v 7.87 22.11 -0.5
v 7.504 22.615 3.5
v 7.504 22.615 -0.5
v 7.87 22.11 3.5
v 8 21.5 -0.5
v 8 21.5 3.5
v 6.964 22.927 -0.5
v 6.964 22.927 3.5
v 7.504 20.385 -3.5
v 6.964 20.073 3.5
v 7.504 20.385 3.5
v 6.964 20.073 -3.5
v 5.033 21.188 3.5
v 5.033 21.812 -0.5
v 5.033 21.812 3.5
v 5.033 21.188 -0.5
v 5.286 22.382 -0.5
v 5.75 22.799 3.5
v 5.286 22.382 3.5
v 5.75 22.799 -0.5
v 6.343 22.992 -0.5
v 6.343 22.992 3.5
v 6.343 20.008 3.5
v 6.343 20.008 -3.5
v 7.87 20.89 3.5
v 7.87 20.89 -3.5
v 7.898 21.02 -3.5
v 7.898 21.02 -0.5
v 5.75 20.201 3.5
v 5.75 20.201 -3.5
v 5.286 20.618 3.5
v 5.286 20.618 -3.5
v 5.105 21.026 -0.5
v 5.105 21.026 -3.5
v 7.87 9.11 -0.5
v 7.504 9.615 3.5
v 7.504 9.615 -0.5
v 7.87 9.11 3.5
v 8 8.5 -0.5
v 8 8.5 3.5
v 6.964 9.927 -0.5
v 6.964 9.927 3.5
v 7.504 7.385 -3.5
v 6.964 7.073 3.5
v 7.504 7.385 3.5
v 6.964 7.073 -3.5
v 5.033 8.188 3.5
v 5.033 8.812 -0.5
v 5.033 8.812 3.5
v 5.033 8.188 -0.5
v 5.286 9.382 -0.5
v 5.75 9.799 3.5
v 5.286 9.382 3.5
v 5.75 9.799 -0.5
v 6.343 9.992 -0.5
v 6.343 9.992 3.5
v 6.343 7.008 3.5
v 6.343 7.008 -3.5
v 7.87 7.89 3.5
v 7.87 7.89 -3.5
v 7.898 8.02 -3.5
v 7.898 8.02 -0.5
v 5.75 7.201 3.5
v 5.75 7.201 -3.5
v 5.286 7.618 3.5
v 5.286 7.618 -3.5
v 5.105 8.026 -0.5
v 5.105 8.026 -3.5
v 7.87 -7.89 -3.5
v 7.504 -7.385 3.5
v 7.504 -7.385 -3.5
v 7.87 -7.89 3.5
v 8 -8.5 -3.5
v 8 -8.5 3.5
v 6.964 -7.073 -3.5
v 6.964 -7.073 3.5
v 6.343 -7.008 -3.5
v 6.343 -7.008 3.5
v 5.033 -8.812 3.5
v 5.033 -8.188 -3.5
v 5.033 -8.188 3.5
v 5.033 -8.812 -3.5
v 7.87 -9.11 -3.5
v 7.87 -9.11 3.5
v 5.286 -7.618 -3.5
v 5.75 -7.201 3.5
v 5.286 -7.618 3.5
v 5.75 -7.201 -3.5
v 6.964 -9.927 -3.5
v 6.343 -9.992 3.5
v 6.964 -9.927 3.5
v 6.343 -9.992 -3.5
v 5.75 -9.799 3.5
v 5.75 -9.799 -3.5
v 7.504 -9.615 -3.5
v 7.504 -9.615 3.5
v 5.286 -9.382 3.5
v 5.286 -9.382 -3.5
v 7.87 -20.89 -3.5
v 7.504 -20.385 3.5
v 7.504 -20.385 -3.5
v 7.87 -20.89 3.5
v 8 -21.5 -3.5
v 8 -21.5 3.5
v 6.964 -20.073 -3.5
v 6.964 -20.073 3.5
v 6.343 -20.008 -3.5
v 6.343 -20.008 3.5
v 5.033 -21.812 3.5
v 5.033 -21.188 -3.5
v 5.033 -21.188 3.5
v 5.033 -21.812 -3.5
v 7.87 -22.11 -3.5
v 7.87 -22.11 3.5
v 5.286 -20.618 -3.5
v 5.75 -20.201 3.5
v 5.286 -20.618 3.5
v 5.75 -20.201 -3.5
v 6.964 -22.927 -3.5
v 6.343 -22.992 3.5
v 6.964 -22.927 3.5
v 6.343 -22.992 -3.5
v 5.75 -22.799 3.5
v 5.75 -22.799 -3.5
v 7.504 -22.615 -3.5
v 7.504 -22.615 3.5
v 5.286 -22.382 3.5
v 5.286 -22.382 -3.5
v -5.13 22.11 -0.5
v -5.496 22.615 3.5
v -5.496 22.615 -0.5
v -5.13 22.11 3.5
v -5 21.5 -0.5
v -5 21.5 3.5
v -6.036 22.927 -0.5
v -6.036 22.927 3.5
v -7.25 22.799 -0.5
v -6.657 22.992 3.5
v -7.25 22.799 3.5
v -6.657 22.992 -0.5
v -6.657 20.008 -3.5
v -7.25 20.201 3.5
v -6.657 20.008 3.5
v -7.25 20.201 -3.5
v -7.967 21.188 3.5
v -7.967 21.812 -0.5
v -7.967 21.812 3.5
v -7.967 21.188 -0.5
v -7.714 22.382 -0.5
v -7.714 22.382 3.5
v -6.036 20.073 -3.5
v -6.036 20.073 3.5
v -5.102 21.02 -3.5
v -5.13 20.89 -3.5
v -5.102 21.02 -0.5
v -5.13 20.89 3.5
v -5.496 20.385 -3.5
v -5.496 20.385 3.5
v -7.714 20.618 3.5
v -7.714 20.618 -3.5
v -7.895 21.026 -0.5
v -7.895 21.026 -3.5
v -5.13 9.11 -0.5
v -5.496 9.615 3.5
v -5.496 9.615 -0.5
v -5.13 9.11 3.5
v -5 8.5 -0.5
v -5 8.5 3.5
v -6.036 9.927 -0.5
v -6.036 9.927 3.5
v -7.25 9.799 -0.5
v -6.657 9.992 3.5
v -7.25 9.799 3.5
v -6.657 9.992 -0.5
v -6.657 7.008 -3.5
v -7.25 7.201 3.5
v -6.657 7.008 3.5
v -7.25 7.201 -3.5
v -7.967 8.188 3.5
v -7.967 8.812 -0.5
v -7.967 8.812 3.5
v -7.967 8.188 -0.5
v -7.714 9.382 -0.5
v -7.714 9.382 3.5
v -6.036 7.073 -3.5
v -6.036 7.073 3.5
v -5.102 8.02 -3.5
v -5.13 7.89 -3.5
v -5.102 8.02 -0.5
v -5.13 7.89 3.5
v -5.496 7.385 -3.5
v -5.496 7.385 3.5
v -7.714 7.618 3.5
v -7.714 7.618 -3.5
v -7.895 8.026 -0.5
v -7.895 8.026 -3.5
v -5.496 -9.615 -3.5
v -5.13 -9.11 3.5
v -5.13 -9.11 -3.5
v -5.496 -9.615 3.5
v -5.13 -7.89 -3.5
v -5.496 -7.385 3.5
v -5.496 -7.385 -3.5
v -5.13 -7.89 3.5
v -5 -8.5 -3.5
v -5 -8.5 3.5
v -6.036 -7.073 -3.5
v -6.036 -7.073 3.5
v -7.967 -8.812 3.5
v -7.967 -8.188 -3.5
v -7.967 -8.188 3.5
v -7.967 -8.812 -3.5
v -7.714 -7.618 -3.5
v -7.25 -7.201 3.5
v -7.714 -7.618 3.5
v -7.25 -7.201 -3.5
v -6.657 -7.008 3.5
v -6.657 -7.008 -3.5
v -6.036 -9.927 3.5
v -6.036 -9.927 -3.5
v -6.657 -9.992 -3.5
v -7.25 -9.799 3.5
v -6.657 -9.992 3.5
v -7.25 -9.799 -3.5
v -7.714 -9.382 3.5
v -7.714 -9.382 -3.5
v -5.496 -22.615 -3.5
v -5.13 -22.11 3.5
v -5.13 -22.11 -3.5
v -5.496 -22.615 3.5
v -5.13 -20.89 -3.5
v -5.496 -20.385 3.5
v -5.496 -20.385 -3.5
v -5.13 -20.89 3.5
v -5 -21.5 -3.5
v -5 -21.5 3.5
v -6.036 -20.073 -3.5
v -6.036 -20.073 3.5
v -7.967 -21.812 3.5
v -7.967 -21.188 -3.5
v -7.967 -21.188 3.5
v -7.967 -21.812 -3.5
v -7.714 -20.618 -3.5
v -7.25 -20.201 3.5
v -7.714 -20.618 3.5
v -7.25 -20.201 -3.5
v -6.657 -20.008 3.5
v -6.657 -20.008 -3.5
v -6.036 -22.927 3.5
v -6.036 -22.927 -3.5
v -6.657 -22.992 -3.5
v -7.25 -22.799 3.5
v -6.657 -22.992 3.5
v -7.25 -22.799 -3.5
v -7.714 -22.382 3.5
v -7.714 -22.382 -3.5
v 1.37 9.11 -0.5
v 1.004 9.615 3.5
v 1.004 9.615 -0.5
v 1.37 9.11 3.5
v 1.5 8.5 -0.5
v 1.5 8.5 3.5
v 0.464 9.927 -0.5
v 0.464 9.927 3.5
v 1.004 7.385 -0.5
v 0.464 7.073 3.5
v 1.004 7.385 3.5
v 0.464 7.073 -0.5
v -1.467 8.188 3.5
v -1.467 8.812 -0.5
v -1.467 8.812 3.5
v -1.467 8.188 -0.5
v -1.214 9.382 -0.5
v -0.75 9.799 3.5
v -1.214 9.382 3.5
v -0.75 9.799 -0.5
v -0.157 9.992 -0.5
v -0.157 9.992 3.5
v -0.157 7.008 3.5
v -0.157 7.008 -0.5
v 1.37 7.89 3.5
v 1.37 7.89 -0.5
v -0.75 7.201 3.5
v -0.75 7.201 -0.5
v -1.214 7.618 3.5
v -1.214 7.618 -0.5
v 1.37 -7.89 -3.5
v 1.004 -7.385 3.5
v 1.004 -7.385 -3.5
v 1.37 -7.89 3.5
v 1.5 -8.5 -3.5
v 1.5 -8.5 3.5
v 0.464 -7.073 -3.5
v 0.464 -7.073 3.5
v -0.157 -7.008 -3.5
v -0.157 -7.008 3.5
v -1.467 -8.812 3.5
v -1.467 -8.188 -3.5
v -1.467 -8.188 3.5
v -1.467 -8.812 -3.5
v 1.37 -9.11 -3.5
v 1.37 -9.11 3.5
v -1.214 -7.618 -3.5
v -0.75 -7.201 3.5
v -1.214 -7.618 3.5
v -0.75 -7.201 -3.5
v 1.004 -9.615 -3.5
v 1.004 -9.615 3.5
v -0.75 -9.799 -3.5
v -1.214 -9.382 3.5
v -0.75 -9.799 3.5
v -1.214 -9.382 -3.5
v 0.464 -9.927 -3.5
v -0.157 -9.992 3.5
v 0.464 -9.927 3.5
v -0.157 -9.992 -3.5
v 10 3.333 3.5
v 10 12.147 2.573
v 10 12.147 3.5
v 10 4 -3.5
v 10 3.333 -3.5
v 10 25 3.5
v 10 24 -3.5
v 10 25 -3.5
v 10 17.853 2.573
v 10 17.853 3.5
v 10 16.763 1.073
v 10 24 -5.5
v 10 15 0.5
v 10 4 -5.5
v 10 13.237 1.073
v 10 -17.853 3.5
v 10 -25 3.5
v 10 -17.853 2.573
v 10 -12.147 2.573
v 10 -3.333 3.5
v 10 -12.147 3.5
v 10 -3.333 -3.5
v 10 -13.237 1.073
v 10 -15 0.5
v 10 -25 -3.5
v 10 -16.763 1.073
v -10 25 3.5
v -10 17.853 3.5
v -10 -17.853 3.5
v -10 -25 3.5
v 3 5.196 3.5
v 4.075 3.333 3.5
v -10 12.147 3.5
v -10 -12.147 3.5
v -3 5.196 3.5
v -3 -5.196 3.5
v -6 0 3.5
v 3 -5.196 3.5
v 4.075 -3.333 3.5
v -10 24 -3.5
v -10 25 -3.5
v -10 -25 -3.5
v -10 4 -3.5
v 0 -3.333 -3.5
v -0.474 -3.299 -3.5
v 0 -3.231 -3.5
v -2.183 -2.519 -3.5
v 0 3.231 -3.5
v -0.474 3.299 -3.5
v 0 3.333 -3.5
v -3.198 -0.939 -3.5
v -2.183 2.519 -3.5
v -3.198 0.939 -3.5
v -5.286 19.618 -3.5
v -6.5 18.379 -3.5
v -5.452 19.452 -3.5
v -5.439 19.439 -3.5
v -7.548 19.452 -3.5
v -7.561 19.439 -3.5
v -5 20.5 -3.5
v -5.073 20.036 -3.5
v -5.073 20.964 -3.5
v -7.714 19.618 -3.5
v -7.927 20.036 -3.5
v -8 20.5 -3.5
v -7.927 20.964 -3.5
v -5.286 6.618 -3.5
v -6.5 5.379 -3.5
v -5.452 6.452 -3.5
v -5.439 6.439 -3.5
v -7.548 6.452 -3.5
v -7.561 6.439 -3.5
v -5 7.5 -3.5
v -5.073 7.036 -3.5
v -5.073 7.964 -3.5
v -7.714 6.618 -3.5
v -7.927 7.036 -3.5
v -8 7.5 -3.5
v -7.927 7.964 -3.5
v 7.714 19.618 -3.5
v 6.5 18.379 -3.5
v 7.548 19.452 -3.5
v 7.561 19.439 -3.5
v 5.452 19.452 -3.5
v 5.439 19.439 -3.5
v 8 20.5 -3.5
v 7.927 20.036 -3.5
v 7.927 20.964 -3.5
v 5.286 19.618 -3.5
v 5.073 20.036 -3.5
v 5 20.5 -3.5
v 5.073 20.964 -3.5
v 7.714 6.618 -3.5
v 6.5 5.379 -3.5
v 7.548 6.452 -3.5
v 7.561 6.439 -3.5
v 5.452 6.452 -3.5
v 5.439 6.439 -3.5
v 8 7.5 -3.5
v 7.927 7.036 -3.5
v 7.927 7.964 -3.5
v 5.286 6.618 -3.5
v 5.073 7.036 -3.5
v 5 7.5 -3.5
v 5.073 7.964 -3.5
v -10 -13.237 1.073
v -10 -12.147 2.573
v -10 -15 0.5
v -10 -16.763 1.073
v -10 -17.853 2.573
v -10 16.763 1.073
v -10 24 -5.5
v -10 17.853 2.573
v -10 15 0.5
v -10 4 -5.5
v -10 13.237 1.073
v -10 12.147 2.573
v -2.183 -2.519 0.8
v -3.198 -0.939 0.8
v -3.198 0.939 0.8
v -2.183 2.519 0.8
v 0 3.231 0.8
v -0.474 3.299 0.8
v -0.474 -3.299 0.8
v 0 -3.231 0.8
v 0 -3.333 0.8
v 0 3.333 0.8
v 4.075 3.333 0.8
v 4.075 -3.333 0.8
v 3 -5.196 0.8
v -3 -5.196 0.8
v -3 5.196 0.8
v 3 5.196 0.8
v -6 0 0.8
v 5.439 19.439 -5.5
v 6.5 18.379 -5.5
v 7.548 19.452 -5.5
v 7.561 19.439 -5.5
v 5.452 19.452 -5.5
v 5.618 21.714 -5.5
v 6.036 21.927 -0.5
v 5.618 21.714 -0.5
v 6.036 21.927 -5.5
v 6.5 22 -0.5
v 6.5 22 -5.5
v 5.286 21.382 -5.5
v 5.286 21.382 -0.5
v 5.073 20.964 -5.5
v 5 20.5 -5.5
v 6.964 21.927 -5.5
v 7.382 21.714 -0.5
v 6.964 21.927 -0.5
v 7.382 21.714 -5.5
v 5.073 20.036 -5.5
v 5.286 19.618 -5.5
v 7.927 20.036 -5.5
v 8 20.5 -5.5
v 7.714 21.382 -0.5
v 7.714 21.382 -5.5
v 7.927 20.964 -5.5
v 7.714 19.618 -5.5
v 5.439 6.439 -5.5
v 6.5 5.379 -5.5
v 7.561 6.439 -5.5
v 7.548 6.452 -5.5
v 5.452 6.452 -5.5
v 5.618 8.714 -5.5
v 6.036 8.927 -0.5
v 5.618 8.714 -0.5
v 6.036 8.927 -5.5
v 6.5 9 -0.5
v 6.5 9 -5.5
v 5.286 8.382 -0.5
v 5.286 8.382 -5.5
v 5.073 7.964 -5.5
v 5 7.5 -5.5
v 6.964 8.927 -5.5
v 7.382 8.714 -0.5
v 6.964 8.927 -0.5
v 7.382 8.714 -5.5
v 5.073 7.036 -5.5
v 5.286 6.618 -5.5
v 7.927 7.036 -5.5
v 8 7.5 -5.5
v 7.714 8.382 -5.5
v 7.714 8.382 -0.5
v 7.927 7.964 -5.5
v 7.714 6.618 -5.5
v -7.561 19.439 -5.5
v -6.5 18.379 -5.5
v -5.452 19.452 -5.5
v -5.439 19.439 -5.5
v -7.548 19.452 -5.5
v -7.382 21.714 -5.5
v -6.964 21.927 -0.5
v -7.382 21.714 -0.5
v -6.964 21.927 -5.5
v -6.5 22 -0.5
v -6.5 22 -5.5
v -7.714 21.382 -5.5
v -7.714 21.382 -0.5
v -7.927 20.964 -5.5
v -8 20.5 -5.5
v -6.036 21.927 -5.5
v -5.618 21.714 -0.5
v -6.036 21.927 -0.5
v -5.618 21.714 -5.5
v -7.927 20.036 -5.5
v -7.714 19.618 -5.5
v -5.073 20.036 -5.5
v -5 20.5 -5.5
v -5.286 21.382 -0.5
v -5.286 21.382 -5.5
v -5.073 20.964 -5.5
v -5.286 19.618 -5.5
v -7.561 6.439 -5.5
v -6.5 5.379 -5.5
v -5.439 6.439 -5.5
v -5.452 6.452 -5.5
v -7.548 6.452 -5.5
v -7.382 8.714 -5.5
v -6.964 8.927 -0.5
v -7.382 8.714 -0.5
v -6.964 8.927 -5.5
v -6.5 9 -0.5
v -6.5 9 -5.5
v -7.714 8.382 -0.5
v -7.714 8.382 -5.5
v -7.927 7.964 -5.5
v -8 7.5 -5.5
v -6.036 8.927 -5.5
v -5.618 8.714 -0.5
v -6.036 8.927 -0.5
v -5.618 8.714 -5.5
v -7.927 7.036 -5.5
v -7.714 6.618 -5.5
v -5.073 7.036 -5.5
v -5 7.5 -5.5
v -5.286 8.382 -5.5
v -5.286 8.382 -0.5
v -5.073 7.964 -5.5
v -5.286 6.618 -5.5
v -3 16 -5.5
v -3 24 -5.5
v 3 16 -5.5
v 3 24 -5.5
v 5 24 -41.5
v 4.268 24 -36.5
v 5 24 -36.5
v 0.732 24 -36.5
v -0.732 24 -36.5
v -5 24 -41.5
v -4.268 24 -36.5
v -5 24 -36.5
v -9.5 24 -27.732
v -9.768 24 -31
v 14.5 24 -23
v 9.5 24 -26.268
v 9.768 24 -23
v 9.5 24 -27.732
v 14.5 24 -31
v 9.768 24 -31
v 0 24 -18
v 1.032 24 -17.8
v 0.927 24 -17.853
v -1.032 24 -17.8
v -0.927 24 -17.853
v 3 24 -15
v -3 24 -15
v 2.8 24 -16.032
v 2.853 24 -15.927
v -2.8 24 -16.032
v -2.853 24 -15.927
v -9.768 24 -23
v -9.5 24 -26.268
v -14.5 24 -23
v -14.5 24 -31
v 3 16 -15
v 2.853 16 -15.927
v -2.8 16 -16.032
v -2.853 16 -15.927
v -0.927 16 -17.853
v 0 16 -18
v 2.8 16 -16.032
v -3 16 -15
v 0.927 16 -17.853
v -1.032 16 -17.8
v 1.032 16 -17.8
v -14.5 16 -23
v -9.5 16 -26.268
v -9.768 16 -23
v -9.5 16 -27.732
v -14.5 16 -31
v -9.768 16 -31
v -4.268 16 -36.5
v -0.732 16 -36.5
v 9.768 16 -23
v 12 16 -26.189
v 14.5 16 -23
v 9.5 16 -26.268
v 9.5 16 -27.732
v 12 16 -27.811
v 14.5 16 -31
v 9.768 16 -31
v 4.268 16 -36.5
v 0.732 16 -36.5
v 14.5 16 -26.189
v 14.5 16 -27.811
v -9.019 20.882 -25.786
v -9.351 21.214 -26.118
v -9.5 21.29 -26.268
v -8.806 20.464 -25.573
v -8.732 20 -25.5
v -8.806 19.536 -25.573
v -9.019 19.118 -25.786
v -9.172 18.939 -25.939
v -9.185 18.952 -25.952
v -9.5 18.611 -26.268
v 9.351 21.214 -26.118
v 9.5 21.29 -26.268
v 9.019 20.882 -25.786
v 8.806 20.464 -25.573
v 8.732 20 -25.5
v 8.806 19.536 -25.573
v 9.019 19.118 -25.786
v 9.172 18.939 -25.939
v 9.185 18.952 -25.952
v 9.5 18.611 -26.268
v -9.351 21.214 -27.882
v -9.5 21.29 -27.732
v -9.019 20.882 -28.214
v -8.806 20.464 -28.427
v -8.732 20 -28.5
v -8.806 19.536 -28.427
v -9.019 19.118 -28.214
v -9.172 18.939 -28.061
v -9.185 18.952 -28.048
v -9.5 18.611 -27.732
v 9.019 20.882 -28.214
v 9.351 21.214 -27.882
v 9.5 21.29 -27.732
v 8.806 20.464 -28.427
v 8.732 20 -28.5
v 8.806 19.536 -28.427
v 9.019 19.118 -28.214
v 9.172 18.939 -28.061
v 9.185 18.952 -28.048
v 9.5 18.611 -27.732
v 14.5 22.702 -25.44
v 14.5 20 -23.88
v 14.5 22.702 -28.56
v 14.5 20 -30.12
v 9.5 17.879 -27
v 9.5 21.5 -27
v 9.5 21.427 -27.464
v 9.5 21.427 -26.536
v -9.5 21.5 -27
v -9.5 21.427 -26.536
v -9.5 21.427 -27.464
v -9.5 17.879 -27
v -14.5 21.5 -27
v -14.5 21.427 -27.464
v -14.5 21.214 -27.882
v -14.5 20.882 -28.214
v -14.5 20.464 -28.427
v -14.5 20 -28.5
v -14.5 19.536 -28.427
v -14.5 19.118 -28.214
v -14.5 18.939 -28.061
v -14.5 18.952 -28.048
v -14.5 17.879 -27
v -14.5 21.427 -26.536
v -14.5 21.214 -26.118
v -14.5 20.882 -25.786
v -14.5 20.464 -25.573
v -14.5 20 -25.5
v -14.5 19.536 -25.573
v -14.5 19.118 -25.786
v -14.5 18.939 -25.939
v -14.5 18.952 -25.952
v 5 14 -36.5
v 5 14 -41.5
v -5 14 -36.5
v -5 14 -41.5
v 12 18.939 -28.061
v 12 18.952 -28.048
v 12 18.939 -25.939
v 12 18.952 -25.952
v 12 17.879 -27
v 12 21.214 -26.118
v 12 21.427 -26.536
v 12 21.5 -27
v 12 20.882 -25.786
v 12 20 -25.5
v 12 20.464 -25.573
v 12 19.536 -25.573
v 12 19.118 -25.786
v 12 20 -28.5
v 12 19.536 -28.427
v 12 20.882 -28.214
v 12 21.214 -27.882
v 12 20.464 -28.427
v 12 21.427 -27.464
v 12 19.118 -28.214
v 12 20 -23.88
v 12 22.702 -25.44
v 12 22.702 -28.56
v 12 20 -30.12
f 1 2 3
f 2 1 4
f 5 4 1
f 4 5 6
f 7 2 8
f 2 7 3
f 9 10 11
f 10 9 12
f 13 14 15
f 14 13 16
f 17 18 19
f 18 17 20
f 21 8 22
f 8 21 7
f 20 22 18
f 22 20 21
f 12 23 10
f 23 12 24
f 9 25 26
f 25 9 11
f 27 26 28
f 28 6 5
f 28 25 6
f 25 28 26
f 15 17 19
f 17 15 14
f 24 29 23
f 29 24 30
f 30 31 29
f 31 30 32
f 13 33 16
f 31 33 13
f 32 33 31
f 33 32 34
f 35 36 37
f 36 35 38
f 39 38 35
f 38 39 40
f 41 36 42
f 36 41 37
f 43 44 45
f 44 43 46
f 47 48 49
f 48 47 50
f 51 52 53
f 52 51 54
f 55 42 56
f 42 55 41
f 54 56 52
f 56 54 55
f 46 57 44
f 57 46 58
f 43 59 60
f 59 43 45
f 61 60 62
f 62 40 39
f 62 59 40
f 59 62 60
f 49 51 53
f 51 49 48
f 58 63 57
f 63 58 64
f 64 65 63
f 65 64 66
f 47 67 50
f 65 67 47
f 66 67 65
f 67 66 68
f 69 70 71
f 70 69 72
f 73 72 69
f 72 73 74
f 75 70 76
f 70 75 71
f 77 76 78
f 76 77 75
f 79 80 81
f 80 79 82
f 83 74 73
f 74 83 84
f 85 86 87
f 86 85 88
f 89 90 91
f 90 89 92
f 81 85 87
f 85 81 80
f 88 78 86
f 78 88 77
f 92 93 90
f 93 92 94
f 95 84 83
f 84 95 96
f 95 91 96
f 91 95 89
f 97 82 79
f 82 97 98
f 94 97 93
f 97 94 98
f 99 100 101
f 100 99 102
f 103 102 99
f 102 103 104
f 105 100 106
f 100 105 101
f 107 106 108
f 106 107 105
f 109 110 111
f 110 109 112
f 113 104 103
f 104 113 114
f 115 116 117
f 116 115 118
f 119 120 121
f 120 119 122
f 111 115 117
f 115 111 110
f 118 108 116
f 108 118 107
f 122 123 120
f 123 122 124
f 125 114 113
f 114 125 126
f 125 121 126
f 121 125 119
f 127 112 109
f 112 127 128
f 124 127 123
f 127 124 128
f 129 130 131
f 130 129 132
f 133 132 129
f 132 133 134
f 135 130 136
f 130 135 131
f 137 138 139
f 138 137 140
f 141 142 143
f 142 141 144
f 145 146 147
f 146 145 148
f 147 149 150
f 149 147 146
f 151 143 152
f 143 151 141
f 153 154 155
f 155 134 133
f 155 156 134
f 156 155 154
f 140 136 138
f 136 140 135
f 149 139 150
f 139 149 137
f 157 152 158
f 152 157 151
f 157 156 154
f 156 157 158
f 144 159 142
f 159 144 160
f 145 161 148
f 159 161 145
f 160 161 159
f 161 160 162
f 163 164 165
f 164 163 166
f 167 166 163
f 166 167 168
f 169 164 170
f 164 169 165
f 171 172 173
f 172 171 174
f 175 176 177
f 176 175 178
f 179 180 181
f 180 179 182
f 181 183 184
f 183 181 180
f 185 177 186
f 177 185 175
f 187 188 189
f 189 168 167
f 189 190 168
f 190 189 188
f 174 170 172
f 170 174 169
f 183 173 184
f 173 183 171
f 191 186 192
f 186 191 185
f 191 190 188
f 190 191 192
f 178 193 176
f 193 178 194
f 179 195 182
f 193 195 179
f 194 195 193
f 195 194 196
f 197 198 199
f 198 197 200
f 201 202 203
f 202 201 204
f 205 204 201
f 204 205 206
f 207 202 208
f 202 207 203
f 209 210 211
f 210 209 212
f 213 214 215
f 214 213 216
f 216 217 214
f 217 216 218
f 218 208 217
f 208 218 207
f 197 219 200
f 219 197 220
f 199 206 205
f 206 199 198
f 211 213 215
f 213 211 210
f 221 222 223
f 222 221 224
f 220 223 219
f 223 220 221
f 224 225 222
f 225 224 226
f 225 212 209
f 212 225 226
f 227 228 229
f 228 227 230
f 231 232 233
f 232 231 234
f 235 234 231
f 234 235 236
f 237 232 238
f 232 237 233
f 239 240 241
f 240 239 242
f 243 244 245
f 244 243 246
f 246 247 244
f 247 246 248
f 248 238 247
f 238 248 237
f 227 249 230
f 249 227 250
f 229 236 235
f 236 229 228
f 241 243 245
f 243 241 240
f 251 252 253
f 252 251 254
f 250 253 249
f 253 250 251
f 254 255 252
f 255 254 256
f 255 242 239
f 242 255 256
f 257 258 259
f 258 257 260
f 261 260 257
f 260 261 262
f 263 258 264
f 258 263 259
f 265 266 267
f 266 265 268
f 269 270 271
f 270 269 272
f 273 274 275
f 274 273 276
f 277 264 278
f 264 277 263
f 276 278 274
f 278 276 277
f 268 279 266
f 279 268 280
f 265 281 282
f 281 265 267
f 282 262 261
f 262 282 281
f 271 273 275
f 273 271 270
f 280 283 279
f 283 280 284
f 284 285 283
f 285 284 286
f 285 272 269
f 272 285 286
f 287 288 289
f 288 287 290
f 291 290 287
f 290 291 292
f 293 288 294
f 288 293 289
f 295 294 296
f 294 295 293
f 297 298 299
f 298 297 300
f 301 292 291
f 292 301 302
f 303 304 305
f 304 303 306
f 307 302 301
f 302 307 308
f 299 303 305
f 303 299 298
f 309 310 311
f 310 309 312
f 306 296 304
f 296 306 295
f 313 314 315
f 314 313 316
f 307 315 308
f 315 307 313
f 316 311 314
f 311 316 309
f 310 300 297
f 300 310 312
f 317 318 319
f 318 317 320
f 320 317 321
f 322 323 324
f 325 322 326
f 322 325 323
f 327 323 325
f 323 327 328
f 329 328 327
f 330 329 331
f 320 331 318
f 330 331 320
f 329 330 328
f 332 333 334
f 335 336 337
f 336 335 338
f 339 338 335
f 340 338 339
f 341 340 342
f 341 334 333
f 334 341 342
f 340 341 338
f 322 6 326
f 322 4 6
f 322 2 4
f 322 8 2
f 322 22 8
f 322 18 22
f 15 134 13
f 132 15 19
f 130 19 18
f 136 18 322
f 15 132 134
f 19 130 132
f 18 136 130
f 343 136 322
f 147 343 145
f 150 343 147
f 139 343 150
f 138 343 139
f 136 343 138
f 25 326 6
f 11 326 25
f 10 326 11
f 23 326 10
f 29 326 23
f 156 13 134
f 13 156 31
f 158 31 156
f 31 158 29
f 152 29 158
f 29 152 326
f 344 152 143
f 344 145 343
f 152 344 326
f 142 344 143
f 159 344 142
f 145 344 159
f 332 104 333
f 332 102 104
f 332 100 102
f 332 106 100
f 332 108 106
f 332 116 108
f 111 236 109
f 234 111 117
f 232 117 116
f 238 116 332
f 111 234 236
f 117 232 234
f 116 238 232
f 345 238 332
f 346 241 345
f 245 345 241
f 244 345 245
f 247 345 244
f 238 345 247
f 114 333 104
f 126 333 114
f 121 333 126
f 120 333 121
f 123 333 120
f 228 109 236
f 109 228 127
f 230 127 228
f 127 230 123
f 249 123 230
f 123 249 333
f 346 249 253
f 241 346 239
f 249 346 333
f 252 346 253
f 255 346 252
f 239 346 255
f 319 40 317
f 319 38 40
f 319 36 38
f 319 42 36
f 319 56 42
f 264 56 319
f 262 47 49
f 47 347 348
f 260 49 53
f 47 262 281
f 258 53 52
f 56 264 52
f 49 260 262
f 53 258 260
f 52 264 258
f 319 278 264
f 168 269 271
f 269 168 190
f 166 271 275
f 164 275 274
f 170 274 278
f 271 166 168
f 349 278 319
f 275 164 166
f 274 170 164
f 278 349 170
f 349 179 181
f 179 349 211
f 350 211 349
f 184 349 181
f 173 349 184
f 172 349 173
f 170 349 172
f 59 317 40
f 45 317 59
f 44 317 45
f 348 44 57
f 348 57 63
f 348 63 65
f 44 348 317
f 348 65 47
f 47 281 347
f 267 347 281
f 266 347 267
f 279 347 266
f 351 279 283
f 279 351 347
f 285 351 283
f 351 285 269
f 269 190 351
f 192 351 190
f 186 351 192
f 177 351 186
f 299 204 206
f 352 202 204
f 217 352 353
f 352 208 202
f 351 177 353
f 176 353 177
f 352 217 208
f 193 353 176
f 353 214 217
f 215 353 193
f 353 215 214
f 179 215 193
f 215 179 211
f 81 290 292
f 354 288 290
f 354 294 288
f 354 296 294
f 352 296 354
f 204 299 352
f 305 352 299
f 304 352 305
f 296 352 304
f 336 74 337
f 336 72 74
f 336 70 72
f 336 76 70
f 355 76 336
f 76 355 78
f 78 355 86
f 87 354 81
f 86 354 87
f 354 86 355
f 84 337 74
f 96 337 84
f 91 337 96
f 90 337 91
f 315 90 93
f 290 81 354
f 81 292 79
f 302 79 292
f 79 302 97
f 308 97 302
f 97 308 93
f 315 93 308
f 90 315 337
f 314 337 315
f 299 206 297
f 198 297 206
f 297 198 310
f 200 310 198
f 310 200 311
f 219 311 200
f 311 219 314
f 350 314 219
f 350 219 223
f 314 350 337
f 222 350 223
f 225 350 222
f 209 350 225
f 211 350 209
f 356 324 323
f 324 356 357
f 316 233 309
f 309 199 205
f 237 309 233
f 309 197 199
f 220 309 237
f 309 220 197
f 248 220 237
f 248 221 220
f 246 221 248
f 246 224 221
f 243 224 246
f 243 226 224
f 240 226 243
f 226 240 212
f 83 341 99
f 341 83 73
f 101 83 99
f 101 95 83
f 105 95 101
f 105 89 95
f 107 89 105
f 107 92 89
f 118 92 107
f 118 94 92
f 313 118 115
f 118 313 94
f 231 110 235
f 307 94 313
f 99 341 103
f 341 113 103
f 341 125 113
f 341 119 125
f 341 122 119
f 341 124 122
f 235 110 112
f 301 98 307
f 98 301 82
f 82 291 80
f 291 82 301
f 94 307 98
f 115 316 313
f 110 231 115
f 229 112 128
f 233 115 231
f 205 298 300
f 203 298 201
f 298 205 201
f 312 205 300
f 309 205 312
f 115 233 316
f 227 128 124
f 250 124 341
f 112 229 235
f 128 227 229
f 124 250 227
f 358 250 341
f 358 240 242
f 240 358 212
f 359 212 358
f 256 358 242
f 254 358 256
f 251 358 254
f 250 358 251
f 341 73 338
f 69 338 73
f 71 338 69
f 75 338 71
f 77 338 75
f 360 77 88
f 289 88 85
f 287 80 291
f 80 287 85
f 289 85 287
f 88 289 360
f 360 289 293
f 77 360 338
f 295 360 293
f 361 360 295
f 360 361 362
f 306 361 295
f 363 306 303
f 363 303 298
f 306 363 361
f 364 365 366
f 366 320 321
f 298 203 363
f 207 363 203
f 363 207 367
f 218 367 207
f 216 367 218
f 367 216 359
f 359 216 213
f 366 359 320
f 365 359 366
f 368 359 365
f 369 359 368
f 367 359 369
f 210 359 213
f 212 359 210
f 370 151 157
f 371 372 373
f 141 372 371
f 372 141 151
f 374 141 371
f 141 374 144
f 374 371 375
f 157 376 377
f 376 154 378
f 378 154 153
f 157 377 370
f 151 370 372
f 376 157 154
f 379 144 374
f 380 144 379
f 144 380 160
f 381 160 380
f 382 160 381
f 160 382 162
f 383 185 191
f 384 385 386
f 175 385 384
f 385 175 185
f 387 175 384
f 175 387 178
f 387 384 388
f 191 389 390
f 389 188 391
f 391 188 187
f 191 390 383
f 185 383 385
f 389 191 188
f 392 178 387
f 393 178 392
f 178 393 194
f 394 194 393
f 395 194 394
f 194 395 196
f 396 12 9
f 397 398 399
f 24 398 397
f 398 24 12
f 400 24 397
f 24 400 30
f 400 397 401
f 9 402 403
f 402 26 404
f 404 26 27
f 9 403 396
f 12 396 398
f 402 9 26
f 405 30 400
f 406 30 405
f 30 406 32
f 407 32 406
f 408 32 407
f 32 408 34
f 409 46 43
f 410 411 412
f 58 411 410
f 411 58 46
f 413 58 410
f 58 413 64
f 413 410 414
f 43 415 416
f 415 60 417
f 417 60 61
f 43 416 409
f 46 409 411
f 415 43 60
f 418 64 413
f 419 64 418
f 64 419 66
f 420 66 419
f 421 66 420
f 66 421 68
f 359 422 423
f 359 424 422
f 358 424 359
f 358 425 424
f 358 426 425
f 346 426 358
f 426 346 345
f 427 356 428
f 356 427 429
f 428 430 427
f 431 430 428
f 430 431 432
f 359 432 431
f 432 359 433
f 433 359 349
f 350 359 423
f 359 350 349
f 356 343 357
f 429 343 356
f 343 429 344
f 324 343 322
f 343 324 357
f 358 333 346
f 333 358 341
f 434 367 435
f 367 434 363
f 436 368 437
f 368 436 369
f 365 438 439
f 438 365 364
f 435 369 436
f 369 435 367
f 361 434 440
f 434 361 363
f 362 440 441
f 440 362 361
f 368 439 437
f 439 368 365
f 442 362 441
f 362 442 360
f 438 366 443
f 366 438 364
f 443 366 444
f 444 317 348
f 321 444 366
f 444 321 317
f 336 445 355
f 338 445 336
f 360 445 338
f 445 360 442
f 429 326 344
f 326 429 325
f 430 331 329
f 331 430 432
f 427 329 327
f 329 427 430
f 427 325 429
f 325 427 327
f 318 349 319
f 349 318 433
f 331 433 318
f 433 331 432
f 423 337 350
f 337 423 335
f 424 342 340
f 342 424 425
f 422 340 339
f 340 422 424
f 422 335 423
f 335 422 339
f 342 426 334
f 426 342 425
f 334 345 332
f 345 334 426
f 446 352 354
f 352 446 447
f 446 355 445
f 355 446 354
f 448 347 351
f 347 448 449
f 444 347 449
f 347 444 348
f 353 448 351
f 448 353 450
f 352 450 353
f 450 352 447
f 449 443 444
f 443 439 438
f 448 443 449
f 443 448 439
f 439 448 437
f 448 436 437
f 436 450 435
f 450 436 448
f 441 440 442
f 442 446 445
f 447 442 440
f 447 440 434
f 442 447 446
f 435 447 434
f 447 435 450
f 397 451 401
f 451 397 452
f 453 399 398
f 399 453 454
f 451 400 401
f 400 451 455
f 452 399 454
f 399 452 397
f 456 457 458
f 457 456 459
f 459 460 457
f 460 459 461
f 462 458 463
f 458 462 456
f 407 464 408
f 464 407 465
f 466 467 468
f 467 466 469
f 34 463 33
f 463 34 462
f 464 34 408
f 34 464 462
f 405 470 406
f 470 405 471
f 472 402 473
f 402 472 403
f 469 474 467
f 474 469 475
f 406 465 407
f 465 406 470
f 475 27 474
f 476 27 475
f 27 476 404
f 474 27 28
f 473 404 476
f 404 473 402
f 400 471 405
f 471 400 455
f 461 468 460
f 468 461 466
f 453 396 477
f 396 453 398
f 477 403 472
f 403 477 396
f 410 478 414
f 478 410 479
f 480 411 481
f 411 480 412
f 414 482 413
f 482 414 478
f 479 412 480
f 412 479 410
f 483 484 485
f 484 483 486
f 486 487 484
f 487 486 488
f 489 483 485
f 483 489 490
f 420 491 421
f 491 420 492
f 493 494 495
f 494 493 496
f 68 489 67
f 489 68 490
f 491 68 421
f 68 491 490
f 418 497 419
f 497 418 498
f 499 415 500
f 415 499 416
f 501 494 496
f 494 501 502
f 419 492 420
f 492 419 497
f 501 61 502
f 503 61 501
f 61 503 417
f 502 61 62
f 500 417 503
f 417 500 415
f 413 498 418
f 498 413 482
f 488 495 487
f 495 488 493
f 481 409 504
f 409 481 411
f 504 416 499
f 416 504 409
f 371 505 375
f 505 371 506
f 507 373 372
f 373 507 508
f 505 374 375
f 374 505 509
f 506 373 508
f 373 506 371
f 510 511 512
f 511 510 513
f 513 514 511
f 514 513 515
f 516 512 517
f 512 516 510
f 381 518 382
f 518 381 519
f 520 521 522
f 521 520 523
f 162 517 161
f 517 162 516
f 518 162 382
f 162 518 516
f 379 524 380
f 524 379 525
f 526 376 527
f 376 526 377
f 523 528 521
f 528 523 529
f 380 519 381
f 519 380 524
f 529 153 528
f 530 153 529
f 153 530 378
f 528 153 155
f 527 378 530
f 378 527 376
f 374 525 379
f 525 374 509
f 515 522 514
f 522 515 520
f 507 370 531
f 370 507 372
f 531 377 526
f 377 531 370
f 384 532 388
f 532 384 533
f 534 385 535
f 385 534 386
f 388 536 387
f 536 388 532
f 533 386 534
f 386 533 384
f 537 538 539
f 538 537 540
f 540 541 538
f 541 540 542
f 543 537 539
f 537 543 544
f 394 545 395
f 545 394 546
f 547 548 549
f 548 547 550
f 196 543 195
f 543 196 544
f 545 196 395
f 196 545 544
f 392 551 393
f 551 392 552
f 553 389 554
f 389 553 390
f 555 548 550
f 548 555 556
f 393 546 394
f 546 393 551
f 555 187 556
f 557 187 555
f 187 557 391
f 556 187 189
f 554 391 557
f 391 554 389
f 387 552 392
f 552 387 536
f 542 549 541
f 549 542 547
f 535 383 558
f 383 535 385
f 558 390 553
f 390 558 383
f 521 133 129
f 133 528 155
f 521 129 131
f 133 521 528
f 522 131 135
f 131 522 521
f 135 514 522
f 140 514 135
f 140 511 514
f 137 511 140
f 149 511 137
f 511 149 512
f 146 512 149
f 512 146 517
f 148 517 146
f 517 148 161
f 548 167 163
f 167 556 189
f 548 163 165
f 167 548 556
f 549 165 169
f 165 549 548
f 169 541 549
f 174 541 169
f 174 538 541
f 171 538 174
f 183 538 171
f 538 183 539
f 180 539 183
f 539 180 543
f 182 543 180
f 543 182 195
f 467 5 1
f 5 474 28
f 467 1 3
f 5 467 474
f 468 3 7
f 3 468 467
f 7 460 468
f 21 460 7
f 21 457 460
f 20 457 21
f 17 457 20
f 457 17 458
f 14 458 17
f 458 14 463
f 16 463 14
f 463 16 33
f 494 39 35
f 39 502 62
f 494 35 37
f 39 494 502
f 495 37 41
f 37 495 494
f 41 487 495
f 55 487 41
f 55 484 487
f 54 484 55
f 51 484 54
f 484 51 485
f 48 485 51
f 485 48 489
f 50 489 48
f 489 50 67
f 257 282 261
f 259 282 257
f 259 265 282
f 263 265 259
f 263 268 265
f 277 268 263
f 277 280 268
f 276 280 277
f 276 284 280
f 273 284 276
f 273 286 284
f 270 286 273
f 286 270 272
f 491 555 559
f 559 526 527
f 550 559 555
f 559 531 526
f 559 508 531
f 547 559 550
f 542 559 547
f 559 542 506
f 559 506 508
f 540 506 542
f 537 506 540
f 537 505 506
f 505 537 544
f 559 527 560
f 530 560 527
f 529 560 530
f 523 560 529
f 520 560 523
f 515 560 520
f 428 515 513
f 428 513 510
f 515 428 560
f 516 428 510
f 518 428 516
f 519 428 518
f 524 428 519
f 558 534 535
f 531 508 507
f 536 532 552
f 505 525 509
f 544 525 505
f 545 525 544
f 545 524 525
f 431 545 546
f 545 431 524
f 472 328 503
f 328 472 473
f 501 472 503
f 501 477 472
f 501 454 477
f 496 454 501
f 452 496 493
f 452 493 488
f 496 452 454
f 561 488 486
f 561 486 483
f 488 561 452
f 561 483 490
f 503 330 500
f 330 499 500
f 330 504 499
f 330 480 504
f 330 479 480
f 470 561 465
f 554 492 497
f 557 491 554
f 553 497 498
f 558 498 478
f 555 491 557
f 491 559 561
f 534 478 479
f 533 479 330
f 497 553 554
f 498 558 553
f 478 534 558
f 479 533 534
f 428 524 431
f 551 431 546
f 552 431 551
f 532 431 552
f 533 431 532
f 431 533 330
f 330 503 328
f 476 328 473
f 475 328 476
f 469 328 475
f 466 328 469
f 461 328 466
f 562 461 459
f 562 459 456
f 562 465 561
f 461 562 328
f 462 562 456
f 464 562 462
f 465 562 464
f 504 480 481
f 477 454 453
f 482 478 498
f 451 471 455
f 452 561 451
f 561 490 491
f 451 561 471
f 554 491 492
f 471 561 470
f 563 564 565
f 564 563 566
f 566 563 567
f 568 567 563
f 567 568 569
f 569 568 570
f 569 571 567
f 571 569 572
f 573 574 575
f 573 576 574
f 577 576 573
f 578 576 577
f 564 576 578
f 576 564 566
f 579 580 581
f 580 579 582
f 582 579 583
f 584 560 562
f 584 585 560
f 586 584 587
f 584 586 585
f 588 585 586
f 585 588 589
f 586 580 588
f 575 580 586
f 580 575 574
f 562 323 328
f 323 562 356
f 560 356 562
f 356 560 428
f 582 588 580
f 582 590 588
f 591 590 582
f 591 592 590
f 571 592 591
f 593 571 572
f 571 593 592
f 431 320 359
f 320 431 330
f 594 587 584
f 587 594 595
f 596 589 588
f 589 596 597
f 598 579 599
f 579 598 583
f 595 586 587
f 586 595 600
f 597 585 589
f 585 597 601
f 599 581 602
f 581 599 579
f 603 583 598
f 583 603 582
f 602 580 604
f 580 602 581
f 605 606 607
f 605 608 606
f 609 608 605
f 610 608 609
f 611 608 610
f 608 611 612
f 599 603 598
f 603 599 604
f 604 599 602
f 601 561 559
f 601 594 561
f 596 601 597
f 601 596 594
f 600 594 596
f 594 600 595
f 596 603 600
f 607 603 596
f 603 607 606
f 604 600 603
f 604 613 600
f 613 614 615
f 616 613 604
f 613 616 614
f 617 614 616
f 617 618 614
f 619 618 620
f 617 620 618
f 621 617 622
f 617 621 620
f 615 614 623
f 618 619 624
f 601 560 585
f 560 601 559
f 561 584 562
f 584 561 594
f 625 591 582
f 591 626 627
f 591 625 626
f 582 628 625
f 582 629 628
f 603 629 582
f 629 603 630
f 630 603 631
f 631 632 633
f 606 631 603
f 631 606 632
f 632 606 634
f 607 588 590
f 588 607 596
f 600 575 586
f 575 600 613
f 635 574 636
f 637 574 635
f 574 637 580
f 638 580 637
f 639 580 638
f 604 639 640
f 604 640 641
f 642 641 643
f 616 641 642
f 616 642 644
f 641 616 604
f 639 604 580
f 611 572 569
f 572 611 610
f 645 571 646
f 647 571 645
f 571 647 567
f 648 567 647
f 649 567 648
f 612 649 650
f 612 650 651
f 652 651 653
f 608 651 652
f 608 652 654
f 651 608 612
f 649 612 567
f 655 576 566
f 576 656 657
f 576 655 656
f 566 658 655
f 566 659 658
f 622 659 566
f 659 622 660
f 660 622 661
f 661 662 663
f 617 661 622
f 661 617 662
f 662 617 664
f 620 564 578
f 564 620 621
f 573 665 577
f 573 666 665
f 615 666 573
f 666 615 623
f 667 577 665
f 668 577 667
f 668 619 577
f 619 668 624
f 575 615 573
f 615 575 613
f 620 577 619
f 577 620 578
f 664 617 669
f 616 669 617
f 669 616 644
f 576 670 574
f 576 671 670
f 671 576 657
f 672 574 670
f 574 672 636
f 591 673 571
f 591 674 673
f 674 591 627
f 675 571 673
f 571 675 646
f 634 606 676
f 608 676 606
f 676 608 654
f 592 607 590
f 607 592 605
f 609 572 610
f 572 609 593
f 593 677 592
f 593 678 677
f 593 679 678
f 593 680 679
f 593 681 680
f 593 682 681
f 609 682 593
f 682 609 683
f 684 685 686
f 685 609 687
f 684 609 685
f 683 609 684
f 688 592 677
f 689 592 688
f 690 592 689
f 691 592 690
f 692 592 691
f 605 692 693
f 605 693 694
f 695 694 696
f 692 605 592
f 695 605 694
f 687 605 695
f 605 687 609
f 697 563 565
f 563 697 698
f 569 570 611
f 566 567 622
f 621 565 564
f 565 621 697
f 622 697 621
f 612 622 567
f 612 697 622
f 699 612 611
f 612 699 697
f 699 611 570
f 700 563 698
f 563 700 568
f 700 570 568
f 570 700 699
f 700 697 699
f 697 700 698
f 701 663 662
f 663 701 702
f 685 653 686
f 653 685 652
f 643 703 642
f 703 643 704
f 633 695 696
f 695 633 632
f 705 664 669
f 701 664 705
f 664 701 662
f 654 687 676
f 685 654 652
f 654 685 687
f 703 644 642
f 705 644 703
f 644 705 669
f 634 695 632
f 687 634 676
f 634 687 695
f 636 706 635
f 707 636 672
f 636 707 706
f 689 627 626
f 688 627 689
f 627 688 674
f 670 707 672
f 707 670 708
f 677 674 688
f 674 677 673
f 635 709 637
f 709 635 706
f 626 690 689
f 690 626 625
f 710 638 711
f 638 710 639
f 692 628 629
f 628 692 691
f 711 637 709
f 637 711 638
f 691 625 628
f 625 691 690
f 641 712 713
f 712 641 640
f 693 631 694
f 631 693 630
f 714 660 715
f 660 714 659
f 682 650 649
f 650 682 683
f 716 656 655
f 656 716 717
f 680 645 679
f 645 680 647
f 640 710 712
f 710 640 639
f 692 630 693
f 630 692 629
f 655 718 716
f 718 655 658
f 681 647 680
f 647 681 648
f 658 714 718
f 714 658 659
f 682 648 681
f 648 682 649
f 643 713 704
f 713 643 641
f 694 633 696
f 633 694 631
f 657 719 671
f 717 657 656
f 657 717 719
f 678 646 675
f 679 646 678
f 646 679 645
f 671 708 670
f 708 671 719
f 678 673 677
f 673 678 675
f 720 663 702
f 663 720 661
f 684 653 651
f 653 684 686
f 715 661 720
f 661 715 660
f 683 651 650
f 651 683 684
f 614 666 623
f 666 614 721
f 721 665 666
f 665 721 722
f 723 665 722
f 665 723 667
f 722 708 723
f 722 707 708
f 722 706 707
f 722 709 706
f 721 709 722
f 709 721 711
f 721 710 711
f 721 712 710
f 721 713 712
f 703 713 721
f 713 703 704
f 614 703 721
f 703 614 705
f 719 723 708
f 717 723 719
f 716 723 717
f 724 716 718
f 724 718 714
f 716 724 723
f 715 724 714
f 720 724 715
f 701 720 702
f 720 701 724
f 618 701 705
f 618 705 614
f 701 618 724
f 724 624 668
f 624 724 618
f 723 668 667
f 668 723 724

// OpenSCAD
// file: parameters.scad
// Parameters file for RepRap Huxley (and maybe Mendel)

huxley=true;
mendel=!huxley;

pi=3.14159265;

// The relative location in your file system where the .dxf files are
// DXFs are for quick development.  They should be replaced by parameterised CSG in dure course.

fileroot="DXF-files/";

rodsize = 6;	//threaded/smooth rod diameter in mm
xaxis = 182.5;	//width of base in mm
yaxis = 266.5;	//length of base in mm


screwsize = 3;	//bearing bore/screw diameter in mm
bearingsize = 10;	//outer diameter of bearings in mm
bearingwidth = 4;	//width of bearings in mm


rodpitch = rodsize / 6;
rodnutsize = 0.8 * rodsize;
rodnutdiameter = 1.9 * rodsize;
rodwashersize = 0.2 * rodsize;
rodwasherdiameter = 2 * rodsize;
screwpitch = screwsize / 6;
nutsize = 0.8 * screwsize;
nutdiameter = 1.9 * screwsize;
washersize = 0.2 * screwsize;
washerdiameter = 2 * screwsize;
partthick = 2 * rodsize;
vertexrodspace = 2 * rodsize;


c = [0.3, 0.3, 0.3];
rodendoffset = rodnutsize + rodwashersize * 2 + partthick / 2;
vertexoffset = vertexrodspace + rodendoffset;


renderrodthreads = false;
renderscrewthreads = false;
fn = 36;

// The gap between the joining rods at a vertex

vertex_radius=sqrt(rodsize*rodsize + vertexoffset*vertexoffset);
vertex_ang = atan(vertexoffset/rodsize)-30;
vertex_gap = 2*vertex_radius*cos(vertex_ang);

// Nema 14 dimensions - these are absolute

nema14_square=35.3;
nema14_screws=26;
nema14_screw_r=1.5;
nema14_hub=22;
nema14_hub_depth=2;
nema14_length=36;
nema14_shaft=5;
nema14_shaft_length=66;
nema14_shaft_projection=19;

// Nema 11 dimensions - these are absolute

nema11_square=28.5;
nema11_screws=23;
nema11_screw_r=1.25;
nema11_hub=22;
nema11_hub_depth=2;
nema11_length=44.5;
nema11_shaft=5;
nema11_shaft_length=78;
nema11_shaft_projection=18;

// Limit switch parameters

limit_switch_hole_diameter=2.5;
limit_switch_centres=9.5;

// The RepRap slide bearings

bearing_mount_centres=18;
bearing_width=7;
bearing_depth=18;

// X axis parameters - many should be relative

x_bar_gap=30;
motor_center_y = 26;
bar_clamp_x=5;
bar_clamp_y=8;
bar_clamp_x_gap=23;
bearing_y=50;
bearing_x=bar_clamp_x_gap + 10;
hole_land=4;
thickness=5;
bearing_low_z = 8;
bearing_z_gap = 25;
bearing_plate_width = bearing_mount_centres+2*hole_land + 10;
bearing_plate_overlap=0.5;
bearing_plate_support=10;
// main file
include <parameters.scad>;
use <library.scad>;

clamp_holes=13;

module x_axis_z_nut_holder()
{
	difference()
	{
		cube([20,50,7], center=true);
		cylinder(r=rodsize/1.8, h= rodsize*10, center=true);
		translate([10,0,0])
		cube([20,2*rodsize/1.8,30], center=true);

		translate([0,x_bar_gap/2,7/2])
			rotate([0,90,0])
				cylinder(r=rodsize/2, h= rodsize*10, center=true);

		translate([0,-x_bar_gap/2,7/2])
			rotate([0,90,0])
				cylinder(r=rodsize/2, h= rodsize*10, center=true);

		for(a = [1, -1])
		{
			translate([0,a*(x_bar_gap/2-clamp_holes/2),0])
					cylinder(r=screwsize/2, h= rodsize*10, center=true, $fn=15);
			for(b = [1, -1])
			for(c = [1, -1])
			translate([a*clamp_holes/2,b*x_bar_gap/2+c*clamp_holes/2,0])
					cylinder(r=screwsize/2, h= rodsize*10, center=true, $fn=15);
		}
		translate([0,0,7/2-0.2])
			cylinder(r=rodsize, h= 5, center=true, $fn=6);
			//rodnut(position=0,washer=0);
	}
}

stretch=1;
halfwidth=12;

module z_height_adjuster()
{
	difference()
	{
		union()
		{

			// Attachment plate

			translate([0,-halfwidth/2,2*stretch*halfwidth])
			{
				difference()
				{
					cube([20,20,5],center=true);

					//translate([0,a*(x_bar_gap/2-clamp_holes/2),0])
						//rotate([0,0,90])
							//teardrop(r=screwsize/2, h= rodsize*10,  truncateMM=-1);
					for(a = [1, -1])
					{

						for(b = [1, -1])
						translate([a*clamp_holes/2,b*clamp_holes/2,-5*rodsize])
								rotate([0,0,90])
									teardrop(r=screwsize/2, h= rodsize*10, truncateMM=-1);
					}
				}
			}

			// Vertical stalk

			strut(p1=[0,0,stretch*halfwidth], p2=[0,0,1.9*stretch*halfwidth],  wide = 8, deep = 6, round = 2);

			// Angled legs

			union()
			{
				strut(p1=[-halfwidth,0,0], p2=[0,0,stretch*halfwidth],  wide = 2.5, deep = 8, round = 1);
				strut(p1=[halfwidth,0,0], p2=[0,0,stretch*halfwidth],  wide = 2.5, deep = 8, round = 1);
				strut(p1=[-halfwidth,0,0], p2=[0,0,-stretch*halfwidth],  wide = 2.5, deep = 8, round = 0);
				strut(p1=[halfwidth,0,0], p2=[0,0,-stretch*halfwidth],  wide = 2.5, deep = 8, round = 0);
			}

			// Screw landing blocks either side

			translate([halfwidth,0,0])
				cube([5,8,8],center=true);
	
			translate([-halfwidth,0,0])
				cube([5,8,8],center=true);


			// Block that pushes the switch
	
			translate([0,-1,-stretch*halfwidth])
				cube([10,10,5],center=true);
		}

		// Screw holes and nut retainer

		rotate([90,0,0])
			rotate([0,90,0])
			{
				translate([0,0,-50])
					teardrop(r=screwsize/2,h=100,truncateMM=-1);
				translate([0,0,halfwidth])
						pentanut(height=10);
			}
	}
}

x_axis_z_nut_holder();

translate([0,20,-stretch*halfwidth-15])
z_height_adjuster();
